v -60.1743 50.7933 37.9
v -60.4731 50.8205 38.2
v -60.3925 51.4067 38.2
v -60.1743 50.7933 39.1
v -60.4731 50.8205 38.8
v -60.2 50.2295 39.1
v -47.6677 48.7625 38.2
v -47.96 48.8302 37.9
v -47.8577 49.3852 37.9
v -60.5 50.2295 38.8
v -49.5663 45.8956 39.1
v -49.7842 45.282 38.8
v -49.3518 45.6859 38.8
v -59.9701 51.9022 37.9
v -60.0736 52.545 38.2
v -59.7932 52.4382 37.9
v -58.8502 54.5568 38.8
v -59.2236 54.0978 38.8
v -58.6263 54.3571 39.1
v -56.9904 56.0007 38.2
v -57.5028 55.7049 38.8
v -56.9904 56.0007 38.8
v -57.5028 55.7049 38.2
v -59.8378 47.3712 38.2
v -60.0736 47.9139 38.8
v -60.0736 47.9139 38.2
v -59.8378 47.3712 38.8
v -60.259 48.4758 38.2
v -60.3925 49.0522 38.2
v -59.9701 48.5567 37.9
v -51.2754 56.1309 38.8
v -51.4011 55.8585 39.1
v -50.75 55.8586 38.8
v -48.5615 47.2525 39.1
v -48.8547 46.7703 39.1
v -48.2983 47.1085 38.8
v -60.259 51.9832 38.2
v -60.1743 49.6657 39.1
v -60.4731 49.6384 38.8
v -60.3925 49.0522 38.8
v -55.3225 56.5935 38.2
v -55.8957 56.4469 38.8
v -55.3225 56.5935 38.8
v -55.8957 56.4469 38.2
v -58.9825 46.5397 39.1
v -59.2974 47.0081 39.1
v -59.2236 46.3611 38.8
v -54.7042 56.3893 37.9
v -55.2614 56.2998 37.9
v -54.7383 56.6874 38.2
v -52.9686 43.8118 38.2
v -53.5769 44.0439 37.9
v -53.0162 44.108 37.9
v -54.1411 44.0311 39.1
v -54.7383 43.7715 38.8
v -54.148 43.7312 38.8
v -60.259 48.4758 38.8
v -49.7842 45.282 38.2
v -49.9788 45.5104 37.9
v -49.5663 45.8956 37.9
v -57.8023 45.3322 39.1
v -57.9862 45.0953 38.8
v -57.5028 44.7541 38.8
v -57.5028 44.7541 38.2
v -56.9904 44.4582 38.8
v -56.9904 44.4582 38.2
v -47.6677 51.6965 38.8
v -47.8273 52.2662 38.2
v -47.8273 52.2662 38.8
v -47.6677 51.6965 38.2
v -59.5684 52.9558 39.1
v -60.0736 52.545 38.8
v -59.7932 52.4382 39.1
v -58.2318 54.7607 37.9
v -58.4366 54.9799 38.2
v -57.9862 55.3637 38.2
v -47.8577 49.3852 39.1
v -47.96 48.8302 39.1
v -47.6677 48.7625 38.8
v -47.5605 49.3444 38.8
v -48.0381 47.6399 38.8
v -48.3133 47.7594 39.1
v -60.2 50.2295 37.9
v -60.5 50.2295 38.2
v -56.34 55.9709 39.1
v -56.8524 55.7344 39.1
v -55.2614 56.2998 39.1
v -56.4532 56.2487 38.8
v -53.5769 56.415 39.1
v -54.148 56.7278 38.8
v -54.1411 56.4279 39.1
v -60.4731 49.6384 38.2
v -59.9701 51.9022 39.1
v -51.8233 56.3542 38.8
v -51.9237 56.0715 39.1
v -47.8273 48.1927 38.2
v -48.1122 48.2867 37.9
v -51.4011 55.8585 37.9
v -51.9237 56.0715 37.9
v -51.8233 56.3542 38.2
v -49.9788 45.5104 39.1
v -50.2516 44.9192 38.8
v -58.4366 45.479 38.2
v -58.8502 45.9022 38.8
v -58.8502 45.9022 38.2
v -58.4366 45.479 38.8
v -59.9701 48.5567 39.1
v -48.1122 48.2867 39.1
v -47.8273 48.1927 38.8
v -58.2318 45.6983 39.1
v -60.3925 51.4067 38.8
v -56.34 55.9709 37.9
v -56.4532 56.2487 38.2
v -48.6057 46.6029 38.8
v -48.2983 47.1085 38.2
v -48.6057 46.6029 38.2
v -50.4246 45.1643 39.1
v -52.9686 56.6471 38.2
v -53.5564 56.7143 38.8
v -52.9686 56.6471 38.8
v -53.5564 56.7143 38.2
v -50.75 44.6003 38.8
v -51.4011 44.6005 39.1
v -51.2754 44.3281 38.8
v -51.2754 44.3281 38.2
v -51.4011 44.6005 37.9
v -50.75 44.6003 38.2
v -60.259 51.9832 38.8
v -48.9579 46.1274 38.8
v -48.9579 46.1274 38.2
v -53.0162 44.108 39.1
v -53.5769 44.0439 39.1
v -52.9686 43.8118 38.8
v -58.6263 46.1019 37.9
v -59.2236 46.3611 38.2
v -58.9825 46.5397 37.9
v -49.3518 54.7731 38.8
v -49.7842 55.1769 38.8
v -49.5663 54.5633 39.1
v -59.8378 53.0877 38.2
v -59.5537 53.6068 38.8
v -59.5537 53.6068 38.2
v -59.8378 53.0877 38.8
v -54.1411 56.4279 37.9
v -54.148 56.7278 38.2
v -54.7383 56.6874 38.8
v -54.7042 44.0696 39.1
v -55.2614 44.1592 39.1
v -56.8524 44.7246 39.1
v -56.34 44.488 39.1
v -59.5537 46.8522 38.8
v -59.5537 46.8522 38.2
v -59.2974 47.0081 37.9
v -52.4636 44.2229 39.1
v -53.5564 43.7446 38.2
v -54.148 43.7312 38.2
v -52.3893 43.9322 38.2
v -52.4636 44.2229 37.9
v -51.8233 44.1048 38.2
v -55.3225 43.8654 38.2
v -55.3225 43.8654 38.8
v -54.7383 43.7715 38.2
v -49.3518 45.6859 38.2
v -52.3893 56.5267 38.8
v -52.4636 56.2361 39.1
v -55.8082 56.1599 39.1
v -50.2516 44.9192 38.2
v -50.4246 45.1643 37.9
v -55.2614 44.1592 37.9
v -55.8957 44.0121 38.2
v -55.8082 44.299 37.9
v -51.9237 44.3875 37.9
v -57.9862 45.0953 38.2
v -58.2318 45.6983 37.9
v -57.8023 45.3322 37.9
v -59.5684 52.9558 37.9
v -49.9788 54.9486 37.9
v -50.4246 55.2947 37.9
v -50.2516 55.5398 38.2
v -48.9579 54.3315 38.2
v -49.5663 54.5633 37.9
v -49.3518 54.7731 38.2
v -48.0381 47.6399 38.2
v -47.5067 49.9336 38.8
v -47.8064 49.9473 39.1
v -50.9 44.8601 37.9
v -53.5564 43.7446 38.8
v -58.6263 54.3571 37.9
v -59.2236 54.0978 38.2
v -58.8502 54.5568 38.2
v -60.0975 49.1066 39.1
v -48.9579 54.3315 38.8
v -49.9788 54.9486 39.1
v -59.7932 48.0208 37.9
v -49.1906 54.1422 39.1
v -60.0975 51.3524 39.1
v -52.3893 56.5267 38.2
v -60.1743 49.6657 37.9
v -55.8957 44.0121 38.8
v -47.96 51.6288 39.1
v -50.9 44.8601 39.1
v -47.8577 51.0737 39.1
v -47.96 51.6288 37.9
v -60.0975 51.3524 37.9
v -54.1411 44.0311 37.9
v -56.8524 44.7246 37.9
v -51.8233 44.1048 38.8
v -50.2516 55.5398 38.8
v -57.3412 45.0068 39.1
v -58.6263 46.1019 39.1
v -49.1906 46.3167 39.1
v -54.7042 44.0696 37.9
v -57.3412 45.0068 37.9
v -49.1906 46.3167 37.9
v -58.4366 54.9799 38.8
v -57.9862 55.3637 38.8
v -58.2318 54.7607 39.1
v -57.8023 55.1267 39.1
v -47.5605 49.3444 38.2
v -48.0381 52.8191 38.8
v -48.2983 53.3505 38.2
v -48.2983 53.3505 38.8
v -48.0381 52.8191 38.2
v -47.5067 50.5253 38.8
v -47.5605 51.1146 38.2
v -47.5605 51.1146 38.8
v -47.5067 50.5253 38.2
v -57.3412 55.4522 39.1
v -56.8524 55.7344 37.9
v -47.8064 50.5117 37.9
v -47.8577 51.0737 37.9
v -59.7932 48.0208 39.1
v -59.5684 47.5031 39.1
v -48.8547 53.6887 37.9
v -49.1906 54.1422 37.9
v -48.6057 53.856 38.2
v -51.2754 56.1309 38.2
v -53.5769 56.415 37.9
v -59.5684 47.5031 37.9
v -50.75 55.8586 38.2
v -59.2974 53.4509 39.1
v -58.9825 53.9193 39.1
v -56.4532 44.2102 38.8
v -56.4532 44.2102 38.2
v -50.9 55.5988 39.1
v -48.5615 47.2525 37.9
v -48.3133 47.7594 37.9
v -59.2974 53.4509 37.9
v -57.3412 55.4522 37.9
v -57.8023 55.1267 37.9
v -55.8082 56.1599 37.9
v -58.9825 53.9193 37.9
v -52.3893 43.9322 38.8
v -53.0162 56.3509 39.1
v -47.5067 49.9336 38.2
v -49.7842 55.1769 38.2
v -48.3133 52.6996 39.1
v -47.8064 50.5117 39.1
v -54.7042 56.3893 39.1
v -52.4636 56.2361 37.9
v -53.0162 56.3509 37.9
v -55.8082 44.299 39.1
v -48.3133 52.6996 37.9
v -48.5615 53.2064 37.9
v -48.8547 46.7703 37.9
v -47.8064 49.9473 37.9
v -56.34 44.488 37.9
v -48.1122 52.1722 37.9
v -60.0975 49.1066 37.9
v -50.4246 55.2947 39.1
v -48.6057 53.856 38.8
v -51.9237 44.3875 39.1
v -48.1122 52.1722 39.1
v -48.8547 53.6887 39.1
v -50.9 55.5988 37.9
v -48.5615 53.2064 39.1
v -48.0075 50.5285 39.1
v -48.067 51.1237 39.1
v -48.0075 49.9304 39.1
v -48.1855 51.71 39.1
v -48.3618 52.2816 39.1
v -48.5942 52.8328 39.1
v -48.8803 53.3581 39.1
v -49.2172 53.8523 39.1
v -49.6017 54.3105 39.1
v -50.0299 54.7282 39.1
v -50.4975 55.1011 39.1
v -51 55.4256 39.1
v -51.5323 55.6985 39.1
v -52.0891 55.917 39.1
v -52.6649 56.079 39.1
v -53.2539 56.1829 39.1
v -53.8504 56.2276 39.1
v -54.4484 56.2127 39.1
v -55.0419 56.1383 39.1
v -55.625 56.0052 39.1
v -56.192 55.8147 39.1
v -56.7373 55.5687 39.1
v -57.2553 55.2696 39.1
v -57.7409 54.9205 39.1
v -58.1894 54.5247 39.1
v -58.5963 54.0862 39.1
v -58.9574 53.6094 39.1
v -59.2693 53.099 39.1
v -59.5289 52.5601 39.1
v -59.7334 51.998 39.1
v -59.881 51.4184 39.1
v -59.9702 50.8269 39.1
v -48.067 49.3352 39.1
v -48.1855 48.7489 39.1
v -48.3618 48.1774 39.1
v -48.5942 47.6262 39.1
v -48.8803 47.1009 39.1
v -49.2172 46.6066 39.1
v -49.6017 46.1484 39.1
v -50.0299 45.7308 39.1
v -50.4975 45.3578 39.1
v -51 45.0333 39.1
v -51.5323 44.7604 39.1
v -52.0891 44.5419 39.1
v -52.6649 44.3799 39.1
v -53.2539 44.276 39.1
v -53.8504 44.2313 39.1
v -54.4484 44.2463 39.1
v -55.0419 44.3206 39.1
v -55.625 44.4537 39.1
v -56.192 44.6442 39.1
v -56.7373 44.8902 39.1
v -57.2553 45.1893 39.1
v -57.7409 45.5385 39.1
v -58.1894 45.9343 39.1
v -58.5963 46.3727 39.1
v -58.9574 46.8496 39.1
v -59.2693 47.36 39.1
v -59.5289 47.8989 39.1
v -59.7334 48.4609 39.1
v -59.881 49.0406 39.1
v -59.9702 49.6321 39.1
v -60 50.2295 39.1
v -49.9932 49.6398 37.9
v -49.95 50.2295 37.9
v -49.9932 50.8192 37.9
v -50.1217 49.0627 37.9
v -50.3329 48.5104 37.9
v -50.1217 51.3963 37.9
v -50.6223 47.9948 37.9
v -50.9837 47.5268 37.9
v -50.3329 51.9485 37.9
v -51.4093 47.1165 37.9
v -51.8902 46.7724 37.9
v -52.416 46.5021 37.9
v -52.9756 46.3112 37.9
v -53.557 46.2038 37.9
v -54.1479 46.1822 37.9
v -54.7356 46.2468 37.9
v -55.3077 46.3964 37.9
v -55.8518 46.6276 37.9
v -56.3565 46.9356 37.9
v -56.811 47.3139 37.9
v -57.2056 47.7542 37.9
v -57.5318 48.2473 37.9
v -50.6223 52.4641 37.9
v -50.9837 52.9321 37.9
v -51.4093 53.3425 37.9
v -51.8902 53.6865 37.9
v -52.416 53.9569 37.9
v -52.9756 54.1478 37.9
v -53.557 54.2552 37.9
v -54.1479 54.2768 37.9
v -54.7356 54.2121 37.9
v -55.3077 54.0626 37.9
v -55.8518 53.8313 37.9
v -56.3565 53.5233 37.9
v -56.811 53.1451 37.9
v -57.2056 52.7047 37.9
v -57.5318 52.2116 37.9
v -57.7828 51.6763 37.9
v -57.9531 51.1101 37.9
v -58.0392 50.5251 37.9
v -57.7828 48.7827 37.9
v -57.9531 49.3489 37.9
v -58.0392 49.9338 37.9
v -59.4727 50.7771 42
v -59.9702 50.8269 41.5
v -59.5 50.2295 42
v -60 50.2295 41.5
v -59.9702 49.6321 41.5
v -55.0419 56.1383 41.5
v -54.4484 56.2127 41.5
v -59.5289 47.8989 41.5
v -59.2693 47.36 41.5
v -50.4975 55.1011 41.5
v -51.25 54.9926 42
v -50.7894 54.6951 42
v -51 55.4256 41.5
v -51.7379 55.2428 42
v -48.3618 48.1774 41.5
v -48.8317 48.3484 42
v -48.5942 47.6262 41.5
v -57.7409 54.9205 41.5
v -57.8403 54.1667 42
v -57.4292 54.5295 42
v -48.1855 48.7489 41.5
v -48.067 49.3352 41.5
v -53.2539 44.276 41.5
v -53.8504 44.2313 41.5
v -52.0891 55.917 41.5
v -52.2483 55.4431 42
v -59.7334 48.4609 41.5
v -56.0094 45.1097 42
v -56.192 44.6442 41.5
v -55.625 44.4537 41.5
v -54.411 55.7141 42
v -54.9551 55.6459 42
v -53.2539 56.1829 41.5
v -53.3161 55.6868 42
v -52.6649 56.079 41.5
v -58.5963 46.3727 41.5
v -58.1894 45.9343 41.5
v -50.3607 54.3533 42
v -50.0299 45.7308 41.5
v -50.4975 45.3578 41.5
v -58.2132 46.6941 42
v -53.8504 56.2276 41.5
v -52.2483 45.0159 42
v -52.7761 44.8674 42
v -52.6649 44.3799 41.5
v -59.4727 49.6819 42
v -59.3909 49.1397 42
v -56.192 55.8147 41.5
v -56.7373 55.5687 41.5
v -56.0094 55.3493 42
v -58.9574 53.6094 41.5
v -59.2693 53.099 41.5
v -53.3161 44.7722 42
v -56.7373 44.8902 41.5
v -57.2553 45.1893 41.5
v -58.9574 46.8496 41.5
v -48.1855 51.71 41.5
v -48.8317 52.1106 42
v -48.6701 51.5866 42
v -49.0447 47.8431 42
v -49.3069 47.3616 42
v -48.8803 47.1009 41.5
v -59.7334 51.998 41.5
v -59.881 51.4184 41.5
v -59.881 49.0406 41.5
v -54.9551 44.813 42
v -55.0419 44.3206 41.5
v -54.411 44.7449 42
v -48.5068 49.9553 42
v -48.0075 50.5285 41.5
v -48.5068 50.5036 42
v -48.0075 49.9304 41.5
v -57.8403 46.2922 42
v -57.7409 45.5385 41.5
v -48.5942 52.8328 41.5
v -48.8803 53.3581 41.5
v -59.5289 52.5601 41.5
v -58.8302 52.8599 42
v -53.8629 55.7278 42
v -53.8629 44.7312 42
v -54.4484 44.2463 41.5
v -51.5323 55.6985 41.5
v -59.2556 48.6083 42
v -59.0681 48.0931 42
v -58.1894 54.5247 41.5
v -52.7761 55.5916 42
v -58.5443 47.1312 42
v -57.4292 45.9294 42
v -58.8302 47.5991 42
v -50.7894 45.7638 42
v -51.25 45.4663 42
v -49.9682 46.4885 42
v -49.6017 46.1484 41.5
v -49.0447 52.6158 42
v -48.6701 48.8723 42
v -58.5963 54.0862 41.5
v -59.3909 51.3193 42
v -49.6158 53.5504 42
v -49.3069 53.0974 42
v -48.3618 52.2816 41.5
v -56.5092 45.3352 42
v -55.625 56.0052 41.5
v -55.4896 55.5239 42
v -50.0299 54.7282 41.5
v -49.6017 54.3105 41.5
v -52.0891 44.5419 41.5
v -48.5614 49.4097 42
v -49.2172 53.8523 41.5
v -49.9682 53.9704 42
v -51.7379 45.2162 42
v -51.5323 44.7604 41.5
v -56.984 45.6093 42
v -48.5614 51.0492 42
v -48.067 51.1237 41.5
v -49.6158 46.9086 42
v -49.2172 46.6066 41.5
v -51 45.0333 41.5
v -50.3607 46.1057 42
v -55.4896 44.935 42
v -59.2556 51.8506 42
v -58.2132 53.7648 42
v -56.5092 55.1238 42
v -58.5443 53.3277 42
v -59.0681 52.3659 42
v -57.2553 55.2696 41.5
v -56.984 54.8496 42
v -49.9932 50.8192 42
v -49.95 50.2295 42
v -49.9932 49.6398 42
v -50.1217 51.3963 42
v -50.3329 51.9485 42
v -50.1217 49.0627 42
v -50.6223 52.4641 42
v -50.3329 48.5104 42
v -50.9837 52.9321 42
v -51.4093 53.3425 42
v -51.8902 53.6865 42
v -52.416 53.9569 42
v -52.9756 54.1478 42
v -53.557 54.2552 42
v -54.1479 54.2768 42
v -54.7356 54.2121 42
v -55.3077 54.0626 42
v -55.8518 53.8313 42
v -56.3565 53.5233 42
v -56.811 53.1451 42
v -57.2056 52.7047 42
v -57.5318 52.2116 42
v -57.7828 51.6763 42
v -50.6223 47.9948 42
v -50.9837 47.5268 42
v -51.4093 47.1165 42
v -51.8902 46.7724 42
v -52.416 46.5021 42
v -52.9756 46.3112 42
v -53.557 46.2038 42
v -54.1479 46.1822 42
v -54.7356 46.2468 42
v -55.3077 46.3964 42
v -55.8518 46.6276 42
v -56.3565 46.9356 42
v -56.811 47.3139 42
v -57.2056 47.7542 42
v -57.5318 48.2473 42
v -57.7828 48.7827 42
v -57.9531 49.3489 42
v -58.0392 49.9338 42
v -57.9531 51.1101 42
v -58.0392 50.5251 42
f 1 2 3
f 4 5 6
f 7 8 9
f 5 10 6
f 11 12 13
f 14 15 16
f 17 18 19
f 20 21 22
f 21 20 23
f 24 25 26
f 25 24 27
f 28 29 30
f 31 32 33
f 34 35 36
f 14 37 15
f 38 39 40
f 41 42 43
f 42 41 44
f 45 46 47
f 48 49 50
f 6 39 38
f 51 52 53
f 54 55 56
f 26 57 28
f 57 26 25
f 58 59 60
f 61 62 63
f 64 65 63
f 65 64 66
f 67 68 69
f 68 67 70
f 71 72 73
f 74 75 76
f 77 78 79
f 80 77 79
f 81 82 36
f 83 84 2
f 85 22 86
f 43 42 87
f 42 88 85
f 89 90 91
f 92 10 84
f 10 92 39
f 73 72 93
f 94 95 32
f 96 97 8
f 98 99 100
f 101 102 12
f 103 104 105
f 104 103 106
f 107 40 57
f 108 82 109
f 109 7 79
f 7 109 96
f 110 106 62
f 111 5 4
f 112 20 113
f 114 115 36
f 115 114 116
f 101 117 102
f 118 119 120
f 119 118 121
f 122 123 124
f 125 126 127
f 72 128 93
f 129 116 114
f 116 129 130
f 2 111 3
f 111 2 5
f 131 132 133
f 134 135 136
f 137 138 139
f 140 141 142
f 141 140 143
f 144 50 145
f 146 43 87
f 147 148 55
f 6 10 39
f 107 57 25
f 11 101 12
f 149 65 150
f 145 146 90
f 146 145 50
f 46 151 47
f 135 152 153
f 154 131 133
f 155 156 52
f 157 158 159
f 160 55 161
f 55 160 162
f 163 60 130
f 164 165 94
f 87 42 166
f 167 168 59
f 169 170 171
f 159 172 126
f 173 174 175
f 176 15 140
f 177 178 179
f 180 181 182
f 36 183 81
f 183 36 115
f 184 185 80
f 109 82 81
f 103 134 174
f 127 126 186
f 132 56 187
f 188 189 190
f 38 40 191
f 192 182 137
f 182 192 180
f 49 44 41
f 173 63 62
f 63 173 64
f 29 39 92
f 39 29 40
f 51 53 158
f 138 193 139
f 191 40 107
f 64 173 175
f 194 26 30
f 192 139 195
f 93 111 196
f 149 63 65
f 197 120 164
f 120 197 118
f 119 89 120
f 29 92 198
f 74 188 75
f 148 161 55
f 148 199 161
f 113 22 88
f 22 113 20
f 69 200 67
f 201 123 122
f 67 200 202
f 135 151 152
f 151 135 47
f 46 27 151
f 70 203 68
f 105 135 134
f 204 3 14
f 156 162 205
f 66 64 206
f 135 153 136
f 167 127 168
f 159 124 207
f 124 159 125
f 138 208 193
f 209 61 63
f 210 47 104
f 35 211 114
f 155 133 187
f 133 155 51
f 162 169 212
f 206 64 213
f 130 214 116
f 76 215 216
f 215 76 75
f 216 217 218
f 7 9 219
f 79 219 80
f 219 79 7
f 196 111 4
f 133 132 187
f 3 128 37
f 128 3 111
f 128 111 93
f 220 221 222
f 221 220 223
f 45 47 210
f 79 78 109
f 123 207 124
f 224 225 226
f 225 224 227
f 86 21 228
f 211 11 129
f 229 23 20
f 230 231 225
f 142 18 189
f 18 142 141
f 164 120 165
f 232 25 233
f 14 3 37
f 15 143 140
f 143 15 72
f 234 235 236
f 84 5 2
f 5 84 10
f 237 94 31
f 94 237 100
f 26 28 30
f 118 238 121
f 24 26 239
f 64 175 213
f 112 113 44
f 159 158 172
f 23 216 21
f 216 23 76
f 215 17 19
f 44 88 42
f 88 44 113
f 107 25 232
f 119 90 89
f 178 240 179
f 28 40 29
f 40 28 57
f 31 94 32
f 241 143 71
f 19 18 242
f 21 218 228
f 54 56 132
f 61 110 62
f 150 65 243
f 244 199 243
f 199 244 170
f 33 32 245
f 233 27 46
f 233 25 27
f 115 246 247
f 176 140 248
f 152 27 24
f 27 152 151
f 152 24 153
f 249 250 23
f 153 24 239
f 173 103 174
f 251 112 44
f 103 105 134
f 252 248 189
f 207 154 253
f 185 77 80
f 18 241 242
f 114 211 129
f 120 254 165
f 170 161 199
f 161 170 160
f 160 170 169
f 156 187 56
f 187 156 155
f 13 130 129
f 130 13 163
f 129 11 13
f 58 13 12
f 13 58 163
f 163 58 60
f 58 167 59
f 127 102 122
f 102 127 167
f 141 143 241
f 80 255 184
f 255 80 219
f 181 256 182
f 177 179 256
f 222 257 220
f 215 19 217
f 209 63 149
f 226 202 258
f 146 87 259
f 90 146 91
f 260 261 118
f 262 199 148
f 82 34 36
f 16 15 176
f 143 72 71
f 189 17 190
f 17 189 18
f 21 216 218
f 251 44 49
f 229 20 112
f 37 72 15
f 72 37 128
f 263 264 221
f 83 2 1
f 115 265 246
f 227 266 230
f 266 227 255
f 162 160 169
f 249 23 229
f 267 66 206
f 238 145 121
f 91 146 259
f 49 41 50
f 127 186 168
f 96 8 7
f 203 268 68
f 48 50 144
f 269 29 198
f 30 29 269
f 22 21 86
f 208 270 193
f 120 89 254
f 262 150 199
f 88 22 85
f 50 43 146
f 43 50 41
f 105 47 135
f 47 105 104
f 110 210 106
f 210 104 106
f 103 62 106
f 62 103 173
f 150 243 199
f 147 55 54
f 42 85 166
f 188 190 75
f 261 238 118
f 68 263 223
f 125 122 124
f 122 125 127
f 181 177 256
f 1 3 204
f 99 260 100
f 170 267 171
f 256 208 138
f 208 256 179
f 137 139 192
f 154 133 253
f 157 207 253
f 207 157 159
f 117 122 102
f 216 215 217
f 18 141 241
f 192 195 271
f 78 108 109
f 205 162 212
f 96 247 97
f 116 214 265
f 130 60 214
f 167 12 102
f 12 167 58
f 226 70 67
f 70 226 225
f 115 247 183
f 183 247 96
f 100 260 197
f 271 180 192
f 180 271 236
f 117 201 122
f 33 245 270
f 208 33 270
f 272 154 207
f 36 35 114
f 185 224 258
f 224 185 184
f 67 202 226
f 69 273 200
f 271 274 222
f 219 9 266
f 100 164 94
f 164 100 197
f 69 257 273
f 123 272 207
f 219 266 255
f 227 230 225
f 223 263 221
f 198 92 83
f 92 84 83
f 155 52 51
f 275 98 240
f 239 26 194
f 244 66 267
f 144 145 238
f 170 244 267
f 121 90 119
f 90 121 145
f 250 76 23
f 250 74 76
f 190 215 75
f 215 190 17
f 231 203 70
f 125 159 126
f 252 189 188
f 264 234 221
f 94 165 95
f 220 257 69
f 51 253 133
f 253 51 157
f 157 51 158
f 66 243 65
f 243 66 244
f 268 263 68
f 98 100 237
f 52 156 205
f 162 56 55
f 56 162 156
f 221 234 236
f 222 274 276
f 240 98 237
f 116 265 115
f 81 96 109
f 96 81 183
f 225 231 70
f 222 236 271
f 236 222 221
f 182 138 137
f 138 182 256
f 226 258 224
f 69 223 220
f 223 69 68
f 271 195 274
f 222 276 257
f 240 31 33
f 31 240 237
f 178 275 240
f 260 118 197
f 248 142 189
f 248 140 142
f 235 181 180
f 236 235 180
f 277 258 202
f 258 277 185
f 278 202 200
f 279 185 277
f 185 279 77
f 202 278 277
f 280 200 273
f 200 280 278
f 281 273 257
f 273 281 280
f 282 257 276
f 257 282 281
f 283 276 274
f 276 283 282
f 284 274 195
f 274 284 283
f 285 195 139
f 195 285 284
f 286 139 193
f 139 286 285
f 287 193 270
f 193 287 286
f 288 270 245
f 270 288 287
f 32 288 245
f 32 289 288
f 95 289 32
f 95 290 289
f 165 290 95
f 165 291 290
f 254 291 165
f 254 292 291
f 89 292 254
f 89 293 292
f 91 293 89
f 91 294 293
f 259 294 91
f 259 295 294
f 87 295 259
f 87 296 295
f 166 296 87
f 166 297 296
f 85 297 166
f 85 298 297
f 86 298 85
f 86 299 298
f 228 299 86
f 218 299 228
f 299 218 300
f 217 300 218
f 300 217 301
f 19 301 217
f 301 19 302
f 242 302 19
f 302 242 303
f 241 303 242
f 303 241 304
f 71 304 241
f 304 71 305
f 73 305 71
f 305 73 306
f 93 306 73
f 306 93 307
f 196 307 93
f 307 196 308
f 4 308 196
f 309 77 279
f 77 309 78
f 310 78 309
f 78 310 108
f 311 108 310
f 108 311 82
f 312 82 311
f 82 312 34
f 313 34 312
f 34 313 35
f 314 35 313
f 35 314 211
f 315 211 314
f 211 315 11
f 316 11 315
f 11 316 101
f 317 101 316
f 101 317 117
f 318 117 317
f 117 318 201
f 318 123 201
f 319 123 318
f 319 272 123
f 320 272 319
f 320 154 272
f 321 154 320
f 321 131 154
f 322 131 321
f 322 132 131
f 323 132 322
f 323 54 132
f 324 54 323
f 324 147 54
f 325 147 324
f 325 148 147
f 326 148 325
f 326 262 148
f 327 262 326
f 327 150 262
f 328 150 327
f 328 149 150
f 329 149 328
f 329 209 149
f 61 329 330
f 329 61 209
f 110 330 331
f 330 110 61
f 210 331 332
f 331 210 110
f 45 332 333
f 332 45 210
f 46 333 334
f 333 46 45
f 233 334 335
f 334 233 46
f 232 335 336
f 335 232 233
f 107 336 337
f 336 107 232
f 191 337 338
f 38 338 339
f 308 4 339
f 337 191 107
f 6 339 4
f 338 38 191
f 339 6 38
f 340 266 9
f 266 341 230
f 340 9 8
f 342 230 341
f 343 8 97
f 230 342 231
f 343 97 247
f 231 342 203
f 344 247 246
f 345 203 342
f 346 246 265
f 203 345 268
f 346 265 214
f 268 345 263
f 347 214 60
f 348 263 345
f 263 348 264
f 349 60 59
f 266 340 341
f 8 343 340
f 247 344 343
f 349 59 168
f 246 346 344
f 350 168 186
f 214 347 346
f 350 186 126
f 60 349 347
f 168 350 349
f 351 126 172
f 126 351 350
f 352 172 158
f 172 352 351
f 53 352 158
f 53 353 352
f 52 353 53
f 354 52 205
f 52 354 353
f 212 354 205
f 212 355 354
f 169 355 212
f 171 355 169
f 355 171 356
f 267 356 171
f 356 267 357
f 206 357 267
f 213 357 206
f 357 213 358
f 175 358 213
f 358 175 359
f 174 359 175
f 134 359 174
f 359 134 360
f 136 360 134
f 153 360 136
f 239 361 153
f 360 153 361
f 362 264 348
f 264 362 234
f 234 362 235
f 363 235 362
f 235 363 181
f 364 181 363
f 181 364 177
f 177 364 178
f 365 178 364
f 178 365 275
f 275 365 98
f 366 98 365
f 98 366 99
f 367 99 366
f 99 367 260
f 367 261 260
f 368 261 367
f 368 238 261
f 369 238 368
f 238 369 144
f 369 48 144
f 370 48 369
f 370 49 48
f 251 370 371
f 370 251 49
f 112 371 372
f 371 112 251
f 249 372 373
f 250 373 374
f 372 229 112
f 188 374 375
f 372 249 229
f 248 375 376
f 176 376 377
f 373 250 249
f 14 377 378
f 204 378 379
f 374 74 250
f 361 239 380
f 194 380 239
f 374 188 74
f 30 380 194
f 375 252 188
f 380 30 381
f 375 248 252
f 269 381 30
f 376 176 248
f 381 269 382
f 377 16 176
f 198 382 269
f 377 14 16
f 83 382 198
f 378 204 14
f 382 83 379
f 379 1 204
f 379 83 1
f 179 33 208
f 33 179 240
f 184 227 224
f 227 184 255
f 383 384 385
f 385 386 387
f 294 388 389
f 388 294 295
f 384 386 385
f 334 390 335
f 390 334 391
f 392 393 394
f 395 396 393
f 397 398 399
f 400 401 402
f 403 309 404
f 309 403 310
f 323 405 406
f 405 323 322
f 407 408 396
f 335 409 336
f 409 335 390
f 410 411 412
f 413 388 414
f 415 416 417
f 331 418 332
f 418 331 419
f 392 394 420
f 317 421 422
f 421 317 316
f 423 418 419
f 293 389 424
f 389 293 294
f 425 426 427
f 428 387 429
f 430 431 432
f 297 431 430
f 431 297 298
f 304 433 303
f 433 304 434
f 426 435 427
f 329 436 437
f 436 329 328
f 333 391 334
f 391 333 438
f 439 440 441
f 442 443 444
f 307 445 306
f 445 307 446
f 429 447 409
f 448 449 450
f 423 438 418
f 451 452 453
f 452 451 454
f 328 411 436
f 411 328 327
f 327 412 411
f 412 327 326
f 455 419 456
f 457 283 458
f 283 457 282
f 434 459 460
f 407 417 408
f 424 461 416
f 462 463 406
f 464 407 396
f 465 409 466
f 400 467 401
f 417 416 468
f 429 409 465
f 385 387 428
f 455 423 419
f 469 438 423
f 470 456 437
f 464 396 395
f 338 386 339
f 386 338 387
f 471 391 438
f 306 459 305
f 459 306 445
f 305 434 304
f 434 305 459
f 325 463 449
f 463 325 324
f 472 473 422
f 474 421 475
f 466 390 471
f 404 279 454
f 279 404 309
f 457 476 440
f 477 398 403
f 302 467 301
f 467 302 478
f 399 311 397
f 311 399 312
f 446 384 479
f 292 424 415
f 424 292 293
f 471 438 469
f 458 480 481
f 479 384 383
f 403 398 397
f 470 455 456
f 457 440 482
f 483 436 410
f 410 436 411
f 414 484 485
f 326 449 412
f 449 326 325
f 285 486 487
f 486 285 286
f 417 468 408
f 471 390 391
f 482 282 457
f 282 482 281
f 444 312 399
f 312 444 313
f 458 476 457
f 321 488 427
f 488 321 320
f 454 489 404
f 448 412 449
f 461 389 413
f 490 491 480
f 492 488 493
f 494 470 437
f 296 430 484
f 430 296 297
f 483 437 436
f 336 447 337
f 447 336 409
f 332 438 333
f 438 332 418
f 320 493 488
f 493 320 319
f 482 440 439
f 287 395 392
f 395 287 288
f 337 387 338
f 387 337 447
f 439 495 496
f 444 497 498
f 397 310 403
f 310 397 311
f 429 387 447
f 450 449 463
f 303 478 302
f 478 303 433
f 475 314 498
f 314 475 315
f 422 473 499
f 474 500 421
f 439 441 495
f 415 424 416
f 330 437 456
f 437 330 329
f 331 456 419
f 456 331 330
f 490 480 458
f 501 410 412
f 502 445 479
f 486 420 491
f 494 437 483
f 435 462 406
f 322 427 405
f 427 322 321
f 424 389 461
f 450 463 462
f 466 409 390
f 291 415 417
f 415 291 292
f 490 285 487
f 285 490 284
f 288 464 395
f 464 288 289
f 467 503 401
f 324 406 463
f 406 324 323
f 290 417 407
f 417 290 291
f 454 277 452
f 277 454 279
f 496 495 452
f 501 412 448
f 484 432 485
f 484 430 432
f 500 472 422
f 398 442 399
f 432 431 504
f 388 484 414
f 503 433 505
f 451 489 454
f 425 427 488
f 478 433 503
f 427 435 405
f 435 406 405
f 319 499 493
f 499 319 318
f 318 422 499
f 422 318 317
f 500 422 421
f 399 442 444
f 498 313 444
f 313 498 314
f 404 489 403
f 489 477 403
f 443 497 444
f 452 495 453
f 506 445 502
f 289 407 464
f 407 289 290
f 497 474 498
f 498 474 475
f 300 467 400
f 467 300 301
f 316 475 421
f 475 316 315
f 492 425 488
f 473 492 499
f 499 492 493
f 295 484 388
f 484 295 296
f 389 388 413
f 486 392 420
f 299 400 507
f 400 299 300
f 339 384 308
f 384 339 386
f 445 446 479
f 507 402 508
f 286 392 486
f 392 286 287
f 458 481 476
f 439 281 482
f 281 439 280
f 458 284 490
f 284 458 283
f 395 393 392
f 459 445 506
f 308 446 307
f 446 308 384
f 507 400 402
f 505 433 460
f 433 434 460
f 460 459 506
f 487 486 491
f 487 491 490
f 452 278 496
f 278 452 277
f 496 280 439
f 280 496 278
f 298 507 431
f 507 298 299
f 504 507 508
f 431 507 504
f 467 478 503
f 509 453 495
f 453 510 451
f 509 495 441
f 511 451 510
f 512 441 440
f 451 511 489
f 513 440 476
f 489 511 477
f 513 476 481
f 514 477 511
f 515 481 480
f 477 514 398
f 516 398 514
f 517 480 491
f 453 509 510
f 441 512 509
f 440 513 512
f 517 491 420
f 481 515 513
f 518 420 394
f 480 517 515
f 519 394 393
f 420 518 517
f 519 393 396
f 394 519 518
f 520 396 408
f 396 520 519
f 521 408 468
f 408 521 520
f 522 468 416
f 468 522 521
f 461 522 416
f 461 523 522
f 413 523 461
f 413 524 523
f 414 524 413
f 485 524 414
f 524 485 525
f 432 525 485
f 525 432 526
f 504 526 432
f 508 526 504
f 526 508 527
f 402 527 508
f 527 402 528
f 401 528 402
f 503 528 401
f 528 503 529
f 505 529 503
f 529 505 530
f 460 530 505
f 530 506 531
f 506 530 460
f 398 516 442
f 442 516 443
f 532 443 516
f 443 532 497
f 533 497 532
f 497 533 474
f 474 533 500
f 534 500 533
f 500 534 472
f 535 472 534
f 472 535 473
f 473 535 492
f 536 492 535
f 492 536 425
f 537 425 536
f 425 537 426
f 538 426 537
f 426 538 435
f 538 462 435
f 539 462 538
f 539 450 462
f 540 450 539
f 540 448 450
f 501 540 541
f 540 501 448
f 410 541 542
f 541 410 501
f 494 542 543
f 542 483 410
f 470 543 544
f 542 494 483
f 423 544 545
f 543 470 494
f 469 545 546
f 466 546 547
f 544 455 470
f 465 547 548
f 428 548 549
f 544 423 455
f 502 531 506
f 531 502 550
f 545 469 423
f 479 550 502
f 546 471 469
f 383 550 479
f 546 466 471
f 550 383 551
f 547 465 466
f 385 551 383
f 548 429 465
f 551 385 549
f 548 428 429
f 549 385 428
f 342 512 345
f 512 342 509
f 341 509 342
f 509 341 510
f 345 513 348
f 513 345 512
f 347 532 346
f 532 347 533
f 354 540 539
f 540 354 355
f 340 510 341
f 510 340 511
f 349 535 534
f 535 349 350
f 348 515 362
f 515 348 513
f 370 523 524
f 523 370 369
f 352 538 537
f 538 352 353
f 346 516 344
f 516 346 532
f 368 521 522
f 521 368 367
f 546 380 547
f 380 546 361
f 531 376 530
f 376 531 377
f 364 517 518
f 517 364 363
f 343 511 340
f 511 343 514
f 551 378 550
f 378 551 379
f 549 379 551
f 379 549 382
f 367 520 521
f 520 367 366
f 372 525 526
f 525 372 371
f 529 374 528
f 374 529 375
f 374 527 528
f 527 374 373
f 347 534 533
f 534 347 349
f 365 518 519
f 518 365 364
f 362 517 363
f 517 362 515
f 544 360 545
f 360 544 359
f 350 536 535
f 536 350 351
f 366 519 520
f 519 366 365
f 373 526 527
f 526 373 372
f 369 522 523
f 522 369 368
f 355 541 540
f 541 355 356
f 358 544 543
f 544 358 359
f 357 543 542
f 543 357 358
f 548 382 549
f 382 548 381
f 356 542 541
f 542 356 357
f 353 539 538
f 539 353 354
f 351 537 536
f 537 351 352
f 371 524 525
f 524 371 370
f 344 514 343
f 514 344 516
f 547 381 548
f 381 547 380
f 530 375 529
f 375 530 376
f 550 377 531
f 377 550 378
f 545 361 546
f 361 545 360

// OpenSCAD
// file: ../../lib/common.scad
// ============================================================================
//  Вспомогательные модули общего назначения.
//  Подключать через use <lib/common.scad> — файл не содержит параметров
//  проекта и ни от чего не зависит.
// ============================================================================

_eps = 0.01;

// --------------------------------------------------------------------- 2D ---
// Прямоугольник со скруглёнными углами, по центру
module rrect(w, d, r) {
    rr = min(r, w/2 - _eps, d/2 - _eps);
    if (rr > 0) offset(r = rr) square([w - 2*rr, d - 2*rr], center = true);
    else square([w, d], center = true);
}

// --------------------------------------------------------------------- 3D ---
// Коробка со скруглением ТОЛЬКО вертикальных рёбер: нижние и верхние острые
module rounded_box(w, d, h, r) linear_extrude(height = h) rrect(w, d, r);

// Цилиндр с фасками на торцах (снимает «слоновью ногу» и облегчает посадку)
module chamfered_cyl(d, h, ch = 0.6, bottom = true, top = true) {
    r  = d/2;
    cb = bottom ? min(ch, h/2) : 0;
    ct = top    ? min(ch, h/2) : 0;
    if (cb <= 0 && ct <= 0) cylinder(d = d, h = h);
    else rotate_extrude(angle = 360) polygon(concat(
        [[0, 0]],
        cb > 0 ? [[r - cb, 0], [r, cb]] : [[r, 0]],
        ct > 0 ? [[r, h - ct], [r - ct, h]] : [[r, h]],
        [[0, h]]));
}

// Труба
module tube(od, id, h) difference() {
    cylinder(d = od, h = h);
    translate([0, 0, -_eps]) cylinder(d = id, h = h + 2*_eps);
}

// Сквозное отверстие, растянутое вверх-вниз для гарантированного вычитания
module thru(d, h) translate([0, 0, -_eps]) cylinder(d = d, h = h + 2*_eps);

// Потайное отверстие под саморез с конической головкой.
// Пластина занимает z = [0 .. t], головка утапливается сверху,
// саморез идёт вниз (в ответную стойку).
module countersunk_hole(free_d, head_d, t, down = 30) {
    cone_h = (head_d - free_d)/2;    // головка 90 градусов
    union() {
        translate([0, 0, -down]) cylinder(d = free_d, h = down + t - cone_h + _eps);
        translate([0, 0, t - cone_h]) cylinder(d1 = free_d, d2 = head_d, h = cone_h);
    }
}

// Паз (щелевое отверстие) длиной len по X, сквозной по высоте h
module slot(len, d, h) hull() for (s = [-1, 1])
    translate([s*(len - d)/2, 0, 0]) cylinder(d = d, h = h);

// Стойка под саморез: цилиндр с пилотным отверстием сверху.
// Снизу фаски нет — стойка растёт из дна детали.
module screw_boss(od, h, pilot_d, pilot_depth, ch = 0.6) difference() {
    chamfered_cyl(od, h, ch = ch, bottom = false, top = true);
    translate([0, 0, h - pilot_depth]) cylinder(d = pilot_d, h = pilot_depth + _eps);
}

// Треугольная косынка в плоскости XZ (катеты l по X и h по Z), толщина t по Y
module gusset(l, h, t) translate([0, -t/2, 0]) linear_extrude(height = t)
    polygon([[0, 0], [l, 0], [0, h]]);

// Конусное гнездо под заточенный винт-ось (ось Z вниз от z=0)
module cone_seat(d, depth) translate([0, 0, -depth])
    cylinder(d1 = 0.2, d2 = d, h = depth + _eps);

// Канавка под круглый пассик: тор, вычитаемый из обода
module belt_groove(pulley_d, groove_r) rotate_extrude(angle = 360)
    translate([pulley_d/2, 0]) circle(r = groove_r);

// Сетка облегчающих отверстий по кругу
module radial_holes(n, r, d, h) for (i = [0 : n - 1])
    rotate([0, 0, i*360/n]) translate([r, 0, 0]) thru(d, h);
// main file
// ============================================================================
//  КОЛПАЧОК ПРОМВАЛА — верхний бортик пассика 2
//
//  Надевается на верхний конец промвала свободно (rod_ring_clr), при
//  необходимости капля клея. Тонкое кольцо внатяг ломается.
//  Нагрузки не несёт: только не даёт пассику соскочить с гладкого вала
//  вверх, когда он ослаблен или его надевают.
//
//  Печать: бортиком на стол.
// ============================================================================

include <../drive_params.scad>
use <../../lib/common.scad>

module drive_idler_cap() {
    translate([idler_pos[0], idler_pos[1], cap_z0]) difference() {
        union() {
            chamfered_cyl(cap_d, 1.2, ch = 0.3);
            chamfered_cyl(spindle_d + 4, cap_h, ch = 0.5, bottom = false);
        }
        thru(spindle_d + rod_bore_clr + rod_ring_clr - cap_fit, cap_h);
    }
}

drive_idler_cap();
